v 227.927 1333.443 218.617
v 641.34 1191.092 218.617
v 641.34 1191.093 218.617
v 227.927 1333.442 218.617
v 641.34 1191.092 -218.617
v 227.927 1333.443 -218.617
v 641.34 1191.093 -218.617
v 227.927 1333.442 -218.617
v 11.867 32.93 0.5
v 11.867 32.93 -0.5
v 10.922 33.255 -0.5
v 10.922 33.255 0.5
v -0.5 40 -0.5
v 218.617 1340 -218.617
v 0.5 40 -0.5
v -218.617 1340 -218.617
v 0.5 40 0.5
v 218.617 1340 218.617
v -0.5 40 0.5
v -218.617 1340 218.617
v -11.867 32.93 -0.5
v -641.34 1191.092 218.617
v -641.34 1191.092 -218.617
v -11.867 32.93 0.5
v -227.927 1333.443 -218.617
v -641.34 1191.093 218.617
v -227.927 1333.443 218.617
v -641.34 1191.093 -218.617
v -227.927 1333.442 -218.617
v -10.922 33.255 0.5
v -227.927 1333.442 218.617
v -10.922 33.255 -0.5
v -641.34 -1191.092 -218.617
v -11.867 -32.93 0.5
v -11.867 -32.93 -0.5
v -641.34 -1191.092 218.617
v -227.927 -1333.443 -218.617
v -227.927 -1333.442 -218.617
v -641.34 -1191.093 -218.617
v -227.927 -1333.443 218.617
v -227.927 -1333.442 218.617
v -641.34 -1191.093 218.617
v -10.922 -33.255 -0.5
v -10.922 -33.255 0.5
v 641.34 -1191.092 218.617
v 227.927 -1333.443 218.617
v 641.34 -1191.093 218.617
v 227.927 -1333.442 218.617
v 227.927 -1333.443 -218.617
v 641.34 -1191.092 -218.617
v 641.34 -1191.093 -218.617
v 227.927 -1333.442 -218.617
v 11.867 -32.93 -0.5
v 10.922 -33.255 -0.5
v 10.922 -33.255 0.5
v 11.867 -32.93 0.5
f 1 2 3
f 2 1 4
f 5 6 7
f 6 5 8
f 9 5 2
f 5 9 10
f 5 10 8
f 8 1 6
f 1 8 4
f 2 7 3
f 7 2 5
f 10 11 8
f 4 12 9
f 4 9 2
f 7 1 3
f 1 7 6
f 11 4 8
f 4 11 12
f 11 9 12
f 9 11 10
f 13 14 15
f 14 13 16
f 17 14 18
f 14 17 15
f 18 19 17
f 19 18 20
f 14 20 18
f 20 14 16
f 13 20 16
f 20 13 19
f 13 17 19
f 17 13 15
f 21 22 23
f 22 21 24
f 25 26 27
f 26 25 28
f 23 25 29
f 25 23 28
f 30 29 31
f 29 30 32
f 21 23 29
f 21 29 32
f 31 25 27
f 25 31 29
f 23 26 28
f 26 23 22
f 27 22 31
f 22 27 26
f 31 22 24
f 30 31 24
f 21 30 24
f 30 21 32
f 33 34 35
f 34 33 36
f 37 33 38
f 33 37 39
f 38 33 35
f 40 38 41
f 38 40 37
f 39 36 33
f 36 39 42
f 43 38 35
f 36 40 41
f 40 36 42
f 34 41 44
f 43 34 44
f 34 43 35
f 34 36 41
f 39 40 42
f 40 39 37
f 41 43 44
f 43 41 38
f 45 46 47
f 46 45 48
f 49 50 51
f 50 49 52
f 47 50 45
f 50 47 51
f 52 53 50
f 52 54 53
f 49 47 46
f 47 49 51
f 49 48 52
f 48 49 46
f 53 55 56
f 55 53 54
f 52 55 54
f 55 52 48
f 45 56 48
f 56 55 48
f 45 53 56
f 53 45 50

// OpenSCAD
/*  Copyright (C) 2022  Adam Green (https://github.com/adamgreen)

    This program is free software; you can redistribute it and/or
    modify it under the terms of the GNU General Public License
    as published by the Free Software Foundation; either version 2
    of the License, or (at your option) any later version.

    This program is distributed in the hope that it will be useful,
    but WITHOUT ANY WARRANTY; without even the implied warranty of
    MERCHANTABILITY or FITNESS FOR A PARTICULAR PURPOSE.  See the
    GNU General Public License for more details.
*/
// Viewing frustrum of the ST VL53L1X range finders that I want to place on my bot. 

// ************
//  Parameters
// ************
// Angle at which sensors on mounted on either side of the central sensor. 
mountAngle = 19.0;
// Radius from center of robot base, at which the sensors will be mounted. 
mountRadius = 160.0/2 - 40.0;
// The diagonal field of view for the sensor. 
fovDiagonal = 27;
// Assuming square pixels, 1:1 aspect ration, then calculate horizontal/vertical FoV. 
fov = sqrt(fovDiagonal^2/2);
// Draw frustrum out to this distance: 1.3m.
dist = 1.3 * 1000;
// Size of sensor in X/Y dimensions, starting point of frustrum. 
sensorSize = 1.0;




frustrum(35, -mountAngle);
frustrum(40, 0);
frustrum(35, mountAngle);

frustrum(35, 180-mountAngle);
frustrum(35, 180+mountAngle);




module frustrum(radius, angle) {
    outerSize = 2*dist*tan(fov/2);

    rotate([0, 0, angle]) {
        hull() {
            translate([0, radius, 0])
                cube([sensorSize, 0.001, sensorSize], center=true);
            translate([0, radius+dist, 0])
                cube([outerSize, 0.001, outerSize], center=true);
        }
    }
}



// Sets the smoothness of arcs/circles.
$fs = 0.1;
$fa = 1;
